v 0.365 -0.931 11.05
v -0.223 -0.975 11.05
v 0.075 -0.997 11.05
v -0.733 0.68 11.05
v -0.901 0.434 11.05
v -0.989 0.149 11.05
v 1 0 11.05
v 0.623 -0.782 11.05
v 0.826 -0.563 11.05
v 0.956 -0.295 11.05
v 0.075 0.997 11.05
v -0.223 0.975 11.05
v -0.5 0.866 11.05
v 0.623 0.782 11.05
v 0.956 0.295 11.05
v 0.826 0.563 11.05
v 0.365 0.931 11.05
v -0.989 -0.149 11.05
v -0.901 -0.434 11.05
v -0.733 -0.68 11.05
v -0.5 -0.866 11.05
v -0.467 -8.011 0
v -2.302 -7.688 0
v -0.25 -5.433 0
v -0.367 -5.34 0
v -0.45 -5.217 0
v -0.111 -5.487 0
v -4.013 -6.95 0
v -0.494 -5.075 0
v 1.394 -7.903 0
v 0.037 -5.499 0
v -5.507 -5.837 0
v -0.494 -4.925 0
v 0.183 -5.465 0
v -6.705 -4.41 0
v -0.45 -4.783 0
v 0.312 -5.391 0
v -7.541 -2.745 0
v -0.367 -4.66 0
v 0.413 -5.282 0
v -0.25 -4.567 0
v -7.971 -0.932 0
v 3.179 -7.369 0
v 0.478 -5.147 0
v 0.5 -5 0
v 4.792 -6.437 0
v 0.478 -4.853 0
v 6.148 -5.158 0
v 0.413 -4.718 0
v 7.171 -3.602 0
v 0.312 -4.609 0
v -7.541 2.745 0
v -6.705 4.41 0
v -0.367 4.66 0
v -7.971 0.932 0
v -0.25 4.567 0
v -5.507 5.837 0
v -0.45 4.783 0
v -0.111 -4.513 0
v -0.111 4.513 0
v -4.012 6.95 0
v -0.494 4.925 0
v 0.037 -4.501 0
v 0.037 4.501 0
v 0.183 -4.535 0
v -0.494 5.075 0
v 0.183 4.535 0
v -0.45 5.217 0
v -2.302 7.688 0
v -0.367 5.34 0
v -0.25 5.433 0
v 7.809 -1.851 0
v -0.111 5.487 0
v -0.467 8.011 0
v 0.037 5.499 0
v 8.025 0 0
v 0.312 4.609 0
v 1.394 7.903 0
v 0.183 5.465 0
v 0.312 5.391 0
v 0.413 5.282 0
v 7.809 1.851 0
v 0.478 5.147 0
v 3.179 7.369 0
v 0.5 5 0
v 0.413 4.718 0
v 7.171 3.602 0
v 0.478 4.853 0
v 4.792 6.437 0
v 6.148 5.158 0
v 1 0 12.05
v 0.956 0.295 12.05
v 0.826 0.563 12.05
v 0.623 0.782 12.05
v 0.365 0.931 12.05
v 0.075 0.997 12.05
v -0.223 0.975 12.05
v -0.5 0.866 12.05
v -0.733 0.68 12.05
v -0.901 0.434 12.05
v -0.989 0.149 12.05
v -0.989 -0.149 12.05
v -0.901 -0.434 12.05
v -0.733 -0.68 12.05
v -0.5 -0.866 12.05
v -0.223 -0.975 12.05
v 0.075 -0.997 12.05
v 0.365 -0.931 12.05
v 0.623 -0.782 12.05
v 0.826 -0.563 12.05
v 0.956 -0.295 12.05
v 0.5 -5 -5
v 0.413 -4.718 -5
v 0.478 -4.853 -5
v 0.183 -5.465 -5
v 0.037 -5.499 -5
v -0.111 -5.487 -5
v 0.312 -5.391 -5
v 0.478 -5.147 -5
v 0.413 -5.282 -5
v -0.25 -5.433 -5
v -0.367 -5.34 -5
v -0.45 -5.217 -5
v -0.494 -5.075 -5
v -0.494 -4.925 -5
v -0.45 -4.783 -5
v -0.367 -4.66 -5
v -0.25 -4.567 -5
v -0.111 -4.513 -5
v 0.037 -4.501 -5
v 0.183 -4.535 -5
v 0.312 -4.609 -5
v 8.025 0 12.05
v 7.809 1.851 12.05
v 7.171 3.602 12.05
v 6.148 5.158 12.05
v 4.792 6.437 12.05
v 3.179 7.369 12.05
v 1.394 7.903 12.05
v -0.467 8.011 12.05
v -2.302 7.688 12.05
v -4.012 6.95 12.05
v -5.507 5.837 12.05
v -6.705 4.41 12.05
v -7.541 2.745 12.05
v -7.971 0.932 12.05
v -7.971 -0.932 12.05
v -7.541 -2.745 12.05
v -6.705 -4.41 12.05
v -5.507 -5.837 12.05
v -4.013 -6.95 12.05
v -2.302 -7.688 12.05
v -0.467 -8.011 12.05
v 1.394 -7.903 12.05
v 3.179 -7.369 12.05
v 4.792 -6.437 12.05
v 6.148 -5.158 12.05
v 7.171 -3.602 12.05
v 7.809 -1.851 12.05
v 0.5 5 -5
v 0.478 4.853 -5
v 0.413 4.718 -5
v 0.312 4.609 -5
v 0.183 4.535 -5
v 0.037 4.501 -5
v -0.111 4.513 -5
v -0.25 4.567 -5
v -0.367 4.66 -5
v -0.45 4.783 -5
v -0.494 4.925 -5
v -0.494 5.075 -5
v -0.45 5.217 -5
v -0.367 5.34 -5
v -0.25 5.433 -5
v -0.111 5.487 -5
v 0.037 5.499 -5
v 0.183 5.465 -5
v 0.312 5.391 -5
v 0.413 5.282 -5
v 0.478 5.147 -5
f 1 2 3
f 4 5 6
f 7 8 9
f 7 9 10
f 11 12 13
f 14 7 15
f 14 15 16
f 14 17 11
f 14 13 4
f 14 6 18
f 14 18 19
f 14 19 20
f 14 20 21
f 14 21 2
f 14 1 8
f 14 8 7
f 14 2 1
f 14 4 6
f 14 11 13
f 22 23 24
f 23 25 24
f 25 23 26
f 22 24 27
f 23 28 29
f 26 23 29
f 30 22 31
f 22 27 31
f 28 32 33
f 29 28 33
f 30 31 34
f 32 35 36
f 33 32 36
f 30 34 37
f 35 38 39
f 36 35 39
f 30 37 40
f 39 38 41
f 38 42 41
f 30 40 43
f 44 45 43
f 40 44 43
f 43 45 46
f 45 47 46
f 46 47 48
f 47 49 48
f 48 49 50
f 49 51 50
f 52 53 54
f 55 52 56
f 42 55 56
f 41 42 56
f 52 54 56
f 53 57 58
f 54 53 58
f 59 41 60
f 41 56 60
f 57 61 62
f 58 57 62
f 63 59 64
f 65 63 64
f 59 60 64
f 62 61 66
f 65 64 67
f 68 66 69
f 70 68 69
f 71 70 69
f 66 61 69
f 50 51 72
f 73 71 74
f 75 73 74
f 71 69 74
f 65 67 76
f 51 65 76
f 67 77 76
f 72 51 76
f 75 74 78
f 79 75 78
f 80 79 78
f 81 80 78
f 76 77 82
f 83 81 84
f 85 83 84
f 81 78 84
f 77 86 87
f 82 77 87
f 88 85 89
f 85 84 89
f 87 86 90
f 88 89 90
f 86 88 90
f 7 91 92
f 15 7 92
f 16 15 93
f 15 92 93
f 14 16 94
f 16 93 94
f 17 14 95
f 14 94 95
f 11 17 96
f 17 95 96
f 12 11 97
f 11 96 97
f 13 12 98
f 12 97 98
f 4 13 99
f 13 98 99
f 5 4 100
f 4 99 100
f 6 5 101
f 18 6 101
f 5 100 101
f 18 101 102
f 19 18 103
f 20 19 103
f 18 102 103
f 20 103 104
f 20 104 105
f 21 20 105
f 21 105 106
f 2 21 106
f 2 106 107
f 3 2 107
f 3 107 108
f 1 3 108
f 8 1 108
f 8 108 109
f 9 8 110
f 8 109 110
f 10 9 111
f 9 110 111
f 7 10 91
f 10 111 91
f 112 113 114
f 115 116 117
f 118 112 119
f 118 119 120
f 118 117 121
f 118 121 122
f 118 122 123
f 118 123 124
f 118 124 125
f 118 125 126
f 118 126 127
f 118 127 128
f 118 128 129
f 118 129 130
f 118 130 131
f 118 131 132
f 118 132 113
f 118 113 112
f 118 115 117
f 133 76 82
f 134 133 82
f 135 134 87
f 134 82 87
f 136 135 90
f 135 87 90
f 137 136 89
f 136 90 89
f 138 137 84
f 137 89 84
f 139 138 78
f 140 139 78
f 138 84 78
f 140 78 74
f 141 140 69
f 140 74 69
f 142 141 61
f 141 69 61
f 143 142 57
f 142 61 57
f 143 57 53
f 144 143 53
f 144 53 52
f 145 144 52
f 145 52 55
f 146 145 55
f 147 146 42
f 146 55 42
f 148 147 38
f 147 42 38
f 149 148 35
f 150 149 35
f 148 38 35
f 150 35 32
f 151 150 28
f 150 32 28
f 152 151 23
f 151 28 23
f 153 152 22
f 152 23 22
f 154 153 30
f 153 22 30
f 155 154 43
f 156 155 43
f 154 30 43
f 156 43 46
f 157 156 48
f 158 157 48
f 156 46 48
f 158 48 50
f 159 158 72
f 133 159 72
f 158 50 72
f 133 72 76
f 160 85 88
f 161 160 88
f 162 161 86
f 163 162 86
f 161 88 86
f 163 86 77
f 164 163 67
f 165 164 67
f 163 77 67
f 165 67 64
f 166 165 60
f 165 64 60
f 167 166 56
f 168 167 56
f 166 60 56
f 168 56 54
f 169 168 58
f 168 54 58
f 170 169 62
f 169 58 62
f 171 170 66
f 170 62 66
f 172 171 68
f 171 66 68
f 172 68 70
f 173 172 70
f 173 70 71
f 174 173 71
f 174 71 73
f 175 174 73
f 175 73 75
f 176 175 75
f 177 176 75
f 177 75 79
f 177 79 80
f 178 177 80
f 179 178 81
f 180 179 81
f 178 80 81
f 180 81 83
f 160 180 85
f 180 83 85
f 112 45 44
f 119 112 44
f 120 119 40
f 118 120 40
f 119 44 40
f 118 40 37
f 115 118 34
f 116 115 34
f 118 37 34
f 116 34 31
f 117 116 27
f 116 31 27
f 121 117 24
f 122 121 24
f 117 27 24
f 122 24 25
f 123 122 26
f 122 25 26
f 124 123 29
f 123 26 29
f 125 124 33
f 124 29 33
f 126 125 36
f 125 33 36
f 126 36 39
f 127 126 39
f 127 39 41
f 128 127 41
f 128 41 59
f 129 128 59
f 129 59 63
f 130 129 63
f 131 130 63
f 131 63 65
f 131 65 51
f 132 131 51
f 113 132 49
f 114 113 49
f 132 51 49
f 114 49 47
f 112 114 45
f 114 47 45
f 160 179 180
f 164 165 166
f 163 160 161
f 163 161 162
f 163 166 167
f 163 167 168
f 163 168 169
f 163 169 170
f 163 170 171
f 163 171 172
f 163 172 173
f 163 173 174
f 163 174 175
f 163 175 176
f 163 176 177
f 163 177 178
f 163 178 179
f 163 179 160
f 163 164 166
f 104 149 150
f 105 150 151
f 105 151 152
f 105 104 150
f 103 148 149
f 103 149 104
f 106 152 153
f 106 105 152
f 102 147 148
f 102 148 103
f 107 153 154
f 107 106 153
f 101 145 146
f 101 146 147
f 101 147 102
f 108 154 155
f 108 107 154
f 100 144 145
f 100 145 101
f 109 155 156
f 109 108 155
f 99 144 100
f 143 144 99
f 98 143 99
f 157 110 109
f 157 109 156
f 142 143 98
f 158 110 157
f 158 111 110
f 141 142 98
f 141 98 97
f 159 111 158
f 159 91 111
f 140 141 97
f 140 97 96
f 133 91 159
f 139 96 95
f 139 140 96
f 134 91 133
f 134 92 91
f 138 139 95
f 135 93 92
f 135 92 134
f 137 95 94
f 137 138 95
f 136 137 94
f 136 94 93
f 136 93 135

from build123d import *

# Parameters (mm, degrees)
CYLINDER_R     = 8.025
CYLINDER_DEPTH = 12.05
SKETCH_R       = 0.5
PAD_DEPTH      = 5
SKETCH001_R    = 1
POCKET_DEPTH   = 1


with BuildPart() as part:
    # Cylinder → Cylinder (new body)
    with BuildSketch(Plane.XY):
        Circle(CYLINDER_R)
    extrude(amount=CYLINDER_DEPTH)

    # Sketch → Pad (new body)
    with BuildSketch(Plane(origin=(0, 0, 0), x_dir=(1, 0, 0), z_dir=(0, 0, -1))):
        with Locations((0, 5)):
            Circle(SKETCH_R)
        with Locations((0, -5)):
            Circle(SKETCH_R)
    extrude(amount=PAD_DEPTH)

    # Sketch001 → Pocket (cut)
    with BuildSketch(Plane.XY.offset(12.05)):
        Circle(SKETCH001_R)
    extrude(amount=-POCKET_DEPTH, mode=Mode.SUBTRACT)


solid = part.part
